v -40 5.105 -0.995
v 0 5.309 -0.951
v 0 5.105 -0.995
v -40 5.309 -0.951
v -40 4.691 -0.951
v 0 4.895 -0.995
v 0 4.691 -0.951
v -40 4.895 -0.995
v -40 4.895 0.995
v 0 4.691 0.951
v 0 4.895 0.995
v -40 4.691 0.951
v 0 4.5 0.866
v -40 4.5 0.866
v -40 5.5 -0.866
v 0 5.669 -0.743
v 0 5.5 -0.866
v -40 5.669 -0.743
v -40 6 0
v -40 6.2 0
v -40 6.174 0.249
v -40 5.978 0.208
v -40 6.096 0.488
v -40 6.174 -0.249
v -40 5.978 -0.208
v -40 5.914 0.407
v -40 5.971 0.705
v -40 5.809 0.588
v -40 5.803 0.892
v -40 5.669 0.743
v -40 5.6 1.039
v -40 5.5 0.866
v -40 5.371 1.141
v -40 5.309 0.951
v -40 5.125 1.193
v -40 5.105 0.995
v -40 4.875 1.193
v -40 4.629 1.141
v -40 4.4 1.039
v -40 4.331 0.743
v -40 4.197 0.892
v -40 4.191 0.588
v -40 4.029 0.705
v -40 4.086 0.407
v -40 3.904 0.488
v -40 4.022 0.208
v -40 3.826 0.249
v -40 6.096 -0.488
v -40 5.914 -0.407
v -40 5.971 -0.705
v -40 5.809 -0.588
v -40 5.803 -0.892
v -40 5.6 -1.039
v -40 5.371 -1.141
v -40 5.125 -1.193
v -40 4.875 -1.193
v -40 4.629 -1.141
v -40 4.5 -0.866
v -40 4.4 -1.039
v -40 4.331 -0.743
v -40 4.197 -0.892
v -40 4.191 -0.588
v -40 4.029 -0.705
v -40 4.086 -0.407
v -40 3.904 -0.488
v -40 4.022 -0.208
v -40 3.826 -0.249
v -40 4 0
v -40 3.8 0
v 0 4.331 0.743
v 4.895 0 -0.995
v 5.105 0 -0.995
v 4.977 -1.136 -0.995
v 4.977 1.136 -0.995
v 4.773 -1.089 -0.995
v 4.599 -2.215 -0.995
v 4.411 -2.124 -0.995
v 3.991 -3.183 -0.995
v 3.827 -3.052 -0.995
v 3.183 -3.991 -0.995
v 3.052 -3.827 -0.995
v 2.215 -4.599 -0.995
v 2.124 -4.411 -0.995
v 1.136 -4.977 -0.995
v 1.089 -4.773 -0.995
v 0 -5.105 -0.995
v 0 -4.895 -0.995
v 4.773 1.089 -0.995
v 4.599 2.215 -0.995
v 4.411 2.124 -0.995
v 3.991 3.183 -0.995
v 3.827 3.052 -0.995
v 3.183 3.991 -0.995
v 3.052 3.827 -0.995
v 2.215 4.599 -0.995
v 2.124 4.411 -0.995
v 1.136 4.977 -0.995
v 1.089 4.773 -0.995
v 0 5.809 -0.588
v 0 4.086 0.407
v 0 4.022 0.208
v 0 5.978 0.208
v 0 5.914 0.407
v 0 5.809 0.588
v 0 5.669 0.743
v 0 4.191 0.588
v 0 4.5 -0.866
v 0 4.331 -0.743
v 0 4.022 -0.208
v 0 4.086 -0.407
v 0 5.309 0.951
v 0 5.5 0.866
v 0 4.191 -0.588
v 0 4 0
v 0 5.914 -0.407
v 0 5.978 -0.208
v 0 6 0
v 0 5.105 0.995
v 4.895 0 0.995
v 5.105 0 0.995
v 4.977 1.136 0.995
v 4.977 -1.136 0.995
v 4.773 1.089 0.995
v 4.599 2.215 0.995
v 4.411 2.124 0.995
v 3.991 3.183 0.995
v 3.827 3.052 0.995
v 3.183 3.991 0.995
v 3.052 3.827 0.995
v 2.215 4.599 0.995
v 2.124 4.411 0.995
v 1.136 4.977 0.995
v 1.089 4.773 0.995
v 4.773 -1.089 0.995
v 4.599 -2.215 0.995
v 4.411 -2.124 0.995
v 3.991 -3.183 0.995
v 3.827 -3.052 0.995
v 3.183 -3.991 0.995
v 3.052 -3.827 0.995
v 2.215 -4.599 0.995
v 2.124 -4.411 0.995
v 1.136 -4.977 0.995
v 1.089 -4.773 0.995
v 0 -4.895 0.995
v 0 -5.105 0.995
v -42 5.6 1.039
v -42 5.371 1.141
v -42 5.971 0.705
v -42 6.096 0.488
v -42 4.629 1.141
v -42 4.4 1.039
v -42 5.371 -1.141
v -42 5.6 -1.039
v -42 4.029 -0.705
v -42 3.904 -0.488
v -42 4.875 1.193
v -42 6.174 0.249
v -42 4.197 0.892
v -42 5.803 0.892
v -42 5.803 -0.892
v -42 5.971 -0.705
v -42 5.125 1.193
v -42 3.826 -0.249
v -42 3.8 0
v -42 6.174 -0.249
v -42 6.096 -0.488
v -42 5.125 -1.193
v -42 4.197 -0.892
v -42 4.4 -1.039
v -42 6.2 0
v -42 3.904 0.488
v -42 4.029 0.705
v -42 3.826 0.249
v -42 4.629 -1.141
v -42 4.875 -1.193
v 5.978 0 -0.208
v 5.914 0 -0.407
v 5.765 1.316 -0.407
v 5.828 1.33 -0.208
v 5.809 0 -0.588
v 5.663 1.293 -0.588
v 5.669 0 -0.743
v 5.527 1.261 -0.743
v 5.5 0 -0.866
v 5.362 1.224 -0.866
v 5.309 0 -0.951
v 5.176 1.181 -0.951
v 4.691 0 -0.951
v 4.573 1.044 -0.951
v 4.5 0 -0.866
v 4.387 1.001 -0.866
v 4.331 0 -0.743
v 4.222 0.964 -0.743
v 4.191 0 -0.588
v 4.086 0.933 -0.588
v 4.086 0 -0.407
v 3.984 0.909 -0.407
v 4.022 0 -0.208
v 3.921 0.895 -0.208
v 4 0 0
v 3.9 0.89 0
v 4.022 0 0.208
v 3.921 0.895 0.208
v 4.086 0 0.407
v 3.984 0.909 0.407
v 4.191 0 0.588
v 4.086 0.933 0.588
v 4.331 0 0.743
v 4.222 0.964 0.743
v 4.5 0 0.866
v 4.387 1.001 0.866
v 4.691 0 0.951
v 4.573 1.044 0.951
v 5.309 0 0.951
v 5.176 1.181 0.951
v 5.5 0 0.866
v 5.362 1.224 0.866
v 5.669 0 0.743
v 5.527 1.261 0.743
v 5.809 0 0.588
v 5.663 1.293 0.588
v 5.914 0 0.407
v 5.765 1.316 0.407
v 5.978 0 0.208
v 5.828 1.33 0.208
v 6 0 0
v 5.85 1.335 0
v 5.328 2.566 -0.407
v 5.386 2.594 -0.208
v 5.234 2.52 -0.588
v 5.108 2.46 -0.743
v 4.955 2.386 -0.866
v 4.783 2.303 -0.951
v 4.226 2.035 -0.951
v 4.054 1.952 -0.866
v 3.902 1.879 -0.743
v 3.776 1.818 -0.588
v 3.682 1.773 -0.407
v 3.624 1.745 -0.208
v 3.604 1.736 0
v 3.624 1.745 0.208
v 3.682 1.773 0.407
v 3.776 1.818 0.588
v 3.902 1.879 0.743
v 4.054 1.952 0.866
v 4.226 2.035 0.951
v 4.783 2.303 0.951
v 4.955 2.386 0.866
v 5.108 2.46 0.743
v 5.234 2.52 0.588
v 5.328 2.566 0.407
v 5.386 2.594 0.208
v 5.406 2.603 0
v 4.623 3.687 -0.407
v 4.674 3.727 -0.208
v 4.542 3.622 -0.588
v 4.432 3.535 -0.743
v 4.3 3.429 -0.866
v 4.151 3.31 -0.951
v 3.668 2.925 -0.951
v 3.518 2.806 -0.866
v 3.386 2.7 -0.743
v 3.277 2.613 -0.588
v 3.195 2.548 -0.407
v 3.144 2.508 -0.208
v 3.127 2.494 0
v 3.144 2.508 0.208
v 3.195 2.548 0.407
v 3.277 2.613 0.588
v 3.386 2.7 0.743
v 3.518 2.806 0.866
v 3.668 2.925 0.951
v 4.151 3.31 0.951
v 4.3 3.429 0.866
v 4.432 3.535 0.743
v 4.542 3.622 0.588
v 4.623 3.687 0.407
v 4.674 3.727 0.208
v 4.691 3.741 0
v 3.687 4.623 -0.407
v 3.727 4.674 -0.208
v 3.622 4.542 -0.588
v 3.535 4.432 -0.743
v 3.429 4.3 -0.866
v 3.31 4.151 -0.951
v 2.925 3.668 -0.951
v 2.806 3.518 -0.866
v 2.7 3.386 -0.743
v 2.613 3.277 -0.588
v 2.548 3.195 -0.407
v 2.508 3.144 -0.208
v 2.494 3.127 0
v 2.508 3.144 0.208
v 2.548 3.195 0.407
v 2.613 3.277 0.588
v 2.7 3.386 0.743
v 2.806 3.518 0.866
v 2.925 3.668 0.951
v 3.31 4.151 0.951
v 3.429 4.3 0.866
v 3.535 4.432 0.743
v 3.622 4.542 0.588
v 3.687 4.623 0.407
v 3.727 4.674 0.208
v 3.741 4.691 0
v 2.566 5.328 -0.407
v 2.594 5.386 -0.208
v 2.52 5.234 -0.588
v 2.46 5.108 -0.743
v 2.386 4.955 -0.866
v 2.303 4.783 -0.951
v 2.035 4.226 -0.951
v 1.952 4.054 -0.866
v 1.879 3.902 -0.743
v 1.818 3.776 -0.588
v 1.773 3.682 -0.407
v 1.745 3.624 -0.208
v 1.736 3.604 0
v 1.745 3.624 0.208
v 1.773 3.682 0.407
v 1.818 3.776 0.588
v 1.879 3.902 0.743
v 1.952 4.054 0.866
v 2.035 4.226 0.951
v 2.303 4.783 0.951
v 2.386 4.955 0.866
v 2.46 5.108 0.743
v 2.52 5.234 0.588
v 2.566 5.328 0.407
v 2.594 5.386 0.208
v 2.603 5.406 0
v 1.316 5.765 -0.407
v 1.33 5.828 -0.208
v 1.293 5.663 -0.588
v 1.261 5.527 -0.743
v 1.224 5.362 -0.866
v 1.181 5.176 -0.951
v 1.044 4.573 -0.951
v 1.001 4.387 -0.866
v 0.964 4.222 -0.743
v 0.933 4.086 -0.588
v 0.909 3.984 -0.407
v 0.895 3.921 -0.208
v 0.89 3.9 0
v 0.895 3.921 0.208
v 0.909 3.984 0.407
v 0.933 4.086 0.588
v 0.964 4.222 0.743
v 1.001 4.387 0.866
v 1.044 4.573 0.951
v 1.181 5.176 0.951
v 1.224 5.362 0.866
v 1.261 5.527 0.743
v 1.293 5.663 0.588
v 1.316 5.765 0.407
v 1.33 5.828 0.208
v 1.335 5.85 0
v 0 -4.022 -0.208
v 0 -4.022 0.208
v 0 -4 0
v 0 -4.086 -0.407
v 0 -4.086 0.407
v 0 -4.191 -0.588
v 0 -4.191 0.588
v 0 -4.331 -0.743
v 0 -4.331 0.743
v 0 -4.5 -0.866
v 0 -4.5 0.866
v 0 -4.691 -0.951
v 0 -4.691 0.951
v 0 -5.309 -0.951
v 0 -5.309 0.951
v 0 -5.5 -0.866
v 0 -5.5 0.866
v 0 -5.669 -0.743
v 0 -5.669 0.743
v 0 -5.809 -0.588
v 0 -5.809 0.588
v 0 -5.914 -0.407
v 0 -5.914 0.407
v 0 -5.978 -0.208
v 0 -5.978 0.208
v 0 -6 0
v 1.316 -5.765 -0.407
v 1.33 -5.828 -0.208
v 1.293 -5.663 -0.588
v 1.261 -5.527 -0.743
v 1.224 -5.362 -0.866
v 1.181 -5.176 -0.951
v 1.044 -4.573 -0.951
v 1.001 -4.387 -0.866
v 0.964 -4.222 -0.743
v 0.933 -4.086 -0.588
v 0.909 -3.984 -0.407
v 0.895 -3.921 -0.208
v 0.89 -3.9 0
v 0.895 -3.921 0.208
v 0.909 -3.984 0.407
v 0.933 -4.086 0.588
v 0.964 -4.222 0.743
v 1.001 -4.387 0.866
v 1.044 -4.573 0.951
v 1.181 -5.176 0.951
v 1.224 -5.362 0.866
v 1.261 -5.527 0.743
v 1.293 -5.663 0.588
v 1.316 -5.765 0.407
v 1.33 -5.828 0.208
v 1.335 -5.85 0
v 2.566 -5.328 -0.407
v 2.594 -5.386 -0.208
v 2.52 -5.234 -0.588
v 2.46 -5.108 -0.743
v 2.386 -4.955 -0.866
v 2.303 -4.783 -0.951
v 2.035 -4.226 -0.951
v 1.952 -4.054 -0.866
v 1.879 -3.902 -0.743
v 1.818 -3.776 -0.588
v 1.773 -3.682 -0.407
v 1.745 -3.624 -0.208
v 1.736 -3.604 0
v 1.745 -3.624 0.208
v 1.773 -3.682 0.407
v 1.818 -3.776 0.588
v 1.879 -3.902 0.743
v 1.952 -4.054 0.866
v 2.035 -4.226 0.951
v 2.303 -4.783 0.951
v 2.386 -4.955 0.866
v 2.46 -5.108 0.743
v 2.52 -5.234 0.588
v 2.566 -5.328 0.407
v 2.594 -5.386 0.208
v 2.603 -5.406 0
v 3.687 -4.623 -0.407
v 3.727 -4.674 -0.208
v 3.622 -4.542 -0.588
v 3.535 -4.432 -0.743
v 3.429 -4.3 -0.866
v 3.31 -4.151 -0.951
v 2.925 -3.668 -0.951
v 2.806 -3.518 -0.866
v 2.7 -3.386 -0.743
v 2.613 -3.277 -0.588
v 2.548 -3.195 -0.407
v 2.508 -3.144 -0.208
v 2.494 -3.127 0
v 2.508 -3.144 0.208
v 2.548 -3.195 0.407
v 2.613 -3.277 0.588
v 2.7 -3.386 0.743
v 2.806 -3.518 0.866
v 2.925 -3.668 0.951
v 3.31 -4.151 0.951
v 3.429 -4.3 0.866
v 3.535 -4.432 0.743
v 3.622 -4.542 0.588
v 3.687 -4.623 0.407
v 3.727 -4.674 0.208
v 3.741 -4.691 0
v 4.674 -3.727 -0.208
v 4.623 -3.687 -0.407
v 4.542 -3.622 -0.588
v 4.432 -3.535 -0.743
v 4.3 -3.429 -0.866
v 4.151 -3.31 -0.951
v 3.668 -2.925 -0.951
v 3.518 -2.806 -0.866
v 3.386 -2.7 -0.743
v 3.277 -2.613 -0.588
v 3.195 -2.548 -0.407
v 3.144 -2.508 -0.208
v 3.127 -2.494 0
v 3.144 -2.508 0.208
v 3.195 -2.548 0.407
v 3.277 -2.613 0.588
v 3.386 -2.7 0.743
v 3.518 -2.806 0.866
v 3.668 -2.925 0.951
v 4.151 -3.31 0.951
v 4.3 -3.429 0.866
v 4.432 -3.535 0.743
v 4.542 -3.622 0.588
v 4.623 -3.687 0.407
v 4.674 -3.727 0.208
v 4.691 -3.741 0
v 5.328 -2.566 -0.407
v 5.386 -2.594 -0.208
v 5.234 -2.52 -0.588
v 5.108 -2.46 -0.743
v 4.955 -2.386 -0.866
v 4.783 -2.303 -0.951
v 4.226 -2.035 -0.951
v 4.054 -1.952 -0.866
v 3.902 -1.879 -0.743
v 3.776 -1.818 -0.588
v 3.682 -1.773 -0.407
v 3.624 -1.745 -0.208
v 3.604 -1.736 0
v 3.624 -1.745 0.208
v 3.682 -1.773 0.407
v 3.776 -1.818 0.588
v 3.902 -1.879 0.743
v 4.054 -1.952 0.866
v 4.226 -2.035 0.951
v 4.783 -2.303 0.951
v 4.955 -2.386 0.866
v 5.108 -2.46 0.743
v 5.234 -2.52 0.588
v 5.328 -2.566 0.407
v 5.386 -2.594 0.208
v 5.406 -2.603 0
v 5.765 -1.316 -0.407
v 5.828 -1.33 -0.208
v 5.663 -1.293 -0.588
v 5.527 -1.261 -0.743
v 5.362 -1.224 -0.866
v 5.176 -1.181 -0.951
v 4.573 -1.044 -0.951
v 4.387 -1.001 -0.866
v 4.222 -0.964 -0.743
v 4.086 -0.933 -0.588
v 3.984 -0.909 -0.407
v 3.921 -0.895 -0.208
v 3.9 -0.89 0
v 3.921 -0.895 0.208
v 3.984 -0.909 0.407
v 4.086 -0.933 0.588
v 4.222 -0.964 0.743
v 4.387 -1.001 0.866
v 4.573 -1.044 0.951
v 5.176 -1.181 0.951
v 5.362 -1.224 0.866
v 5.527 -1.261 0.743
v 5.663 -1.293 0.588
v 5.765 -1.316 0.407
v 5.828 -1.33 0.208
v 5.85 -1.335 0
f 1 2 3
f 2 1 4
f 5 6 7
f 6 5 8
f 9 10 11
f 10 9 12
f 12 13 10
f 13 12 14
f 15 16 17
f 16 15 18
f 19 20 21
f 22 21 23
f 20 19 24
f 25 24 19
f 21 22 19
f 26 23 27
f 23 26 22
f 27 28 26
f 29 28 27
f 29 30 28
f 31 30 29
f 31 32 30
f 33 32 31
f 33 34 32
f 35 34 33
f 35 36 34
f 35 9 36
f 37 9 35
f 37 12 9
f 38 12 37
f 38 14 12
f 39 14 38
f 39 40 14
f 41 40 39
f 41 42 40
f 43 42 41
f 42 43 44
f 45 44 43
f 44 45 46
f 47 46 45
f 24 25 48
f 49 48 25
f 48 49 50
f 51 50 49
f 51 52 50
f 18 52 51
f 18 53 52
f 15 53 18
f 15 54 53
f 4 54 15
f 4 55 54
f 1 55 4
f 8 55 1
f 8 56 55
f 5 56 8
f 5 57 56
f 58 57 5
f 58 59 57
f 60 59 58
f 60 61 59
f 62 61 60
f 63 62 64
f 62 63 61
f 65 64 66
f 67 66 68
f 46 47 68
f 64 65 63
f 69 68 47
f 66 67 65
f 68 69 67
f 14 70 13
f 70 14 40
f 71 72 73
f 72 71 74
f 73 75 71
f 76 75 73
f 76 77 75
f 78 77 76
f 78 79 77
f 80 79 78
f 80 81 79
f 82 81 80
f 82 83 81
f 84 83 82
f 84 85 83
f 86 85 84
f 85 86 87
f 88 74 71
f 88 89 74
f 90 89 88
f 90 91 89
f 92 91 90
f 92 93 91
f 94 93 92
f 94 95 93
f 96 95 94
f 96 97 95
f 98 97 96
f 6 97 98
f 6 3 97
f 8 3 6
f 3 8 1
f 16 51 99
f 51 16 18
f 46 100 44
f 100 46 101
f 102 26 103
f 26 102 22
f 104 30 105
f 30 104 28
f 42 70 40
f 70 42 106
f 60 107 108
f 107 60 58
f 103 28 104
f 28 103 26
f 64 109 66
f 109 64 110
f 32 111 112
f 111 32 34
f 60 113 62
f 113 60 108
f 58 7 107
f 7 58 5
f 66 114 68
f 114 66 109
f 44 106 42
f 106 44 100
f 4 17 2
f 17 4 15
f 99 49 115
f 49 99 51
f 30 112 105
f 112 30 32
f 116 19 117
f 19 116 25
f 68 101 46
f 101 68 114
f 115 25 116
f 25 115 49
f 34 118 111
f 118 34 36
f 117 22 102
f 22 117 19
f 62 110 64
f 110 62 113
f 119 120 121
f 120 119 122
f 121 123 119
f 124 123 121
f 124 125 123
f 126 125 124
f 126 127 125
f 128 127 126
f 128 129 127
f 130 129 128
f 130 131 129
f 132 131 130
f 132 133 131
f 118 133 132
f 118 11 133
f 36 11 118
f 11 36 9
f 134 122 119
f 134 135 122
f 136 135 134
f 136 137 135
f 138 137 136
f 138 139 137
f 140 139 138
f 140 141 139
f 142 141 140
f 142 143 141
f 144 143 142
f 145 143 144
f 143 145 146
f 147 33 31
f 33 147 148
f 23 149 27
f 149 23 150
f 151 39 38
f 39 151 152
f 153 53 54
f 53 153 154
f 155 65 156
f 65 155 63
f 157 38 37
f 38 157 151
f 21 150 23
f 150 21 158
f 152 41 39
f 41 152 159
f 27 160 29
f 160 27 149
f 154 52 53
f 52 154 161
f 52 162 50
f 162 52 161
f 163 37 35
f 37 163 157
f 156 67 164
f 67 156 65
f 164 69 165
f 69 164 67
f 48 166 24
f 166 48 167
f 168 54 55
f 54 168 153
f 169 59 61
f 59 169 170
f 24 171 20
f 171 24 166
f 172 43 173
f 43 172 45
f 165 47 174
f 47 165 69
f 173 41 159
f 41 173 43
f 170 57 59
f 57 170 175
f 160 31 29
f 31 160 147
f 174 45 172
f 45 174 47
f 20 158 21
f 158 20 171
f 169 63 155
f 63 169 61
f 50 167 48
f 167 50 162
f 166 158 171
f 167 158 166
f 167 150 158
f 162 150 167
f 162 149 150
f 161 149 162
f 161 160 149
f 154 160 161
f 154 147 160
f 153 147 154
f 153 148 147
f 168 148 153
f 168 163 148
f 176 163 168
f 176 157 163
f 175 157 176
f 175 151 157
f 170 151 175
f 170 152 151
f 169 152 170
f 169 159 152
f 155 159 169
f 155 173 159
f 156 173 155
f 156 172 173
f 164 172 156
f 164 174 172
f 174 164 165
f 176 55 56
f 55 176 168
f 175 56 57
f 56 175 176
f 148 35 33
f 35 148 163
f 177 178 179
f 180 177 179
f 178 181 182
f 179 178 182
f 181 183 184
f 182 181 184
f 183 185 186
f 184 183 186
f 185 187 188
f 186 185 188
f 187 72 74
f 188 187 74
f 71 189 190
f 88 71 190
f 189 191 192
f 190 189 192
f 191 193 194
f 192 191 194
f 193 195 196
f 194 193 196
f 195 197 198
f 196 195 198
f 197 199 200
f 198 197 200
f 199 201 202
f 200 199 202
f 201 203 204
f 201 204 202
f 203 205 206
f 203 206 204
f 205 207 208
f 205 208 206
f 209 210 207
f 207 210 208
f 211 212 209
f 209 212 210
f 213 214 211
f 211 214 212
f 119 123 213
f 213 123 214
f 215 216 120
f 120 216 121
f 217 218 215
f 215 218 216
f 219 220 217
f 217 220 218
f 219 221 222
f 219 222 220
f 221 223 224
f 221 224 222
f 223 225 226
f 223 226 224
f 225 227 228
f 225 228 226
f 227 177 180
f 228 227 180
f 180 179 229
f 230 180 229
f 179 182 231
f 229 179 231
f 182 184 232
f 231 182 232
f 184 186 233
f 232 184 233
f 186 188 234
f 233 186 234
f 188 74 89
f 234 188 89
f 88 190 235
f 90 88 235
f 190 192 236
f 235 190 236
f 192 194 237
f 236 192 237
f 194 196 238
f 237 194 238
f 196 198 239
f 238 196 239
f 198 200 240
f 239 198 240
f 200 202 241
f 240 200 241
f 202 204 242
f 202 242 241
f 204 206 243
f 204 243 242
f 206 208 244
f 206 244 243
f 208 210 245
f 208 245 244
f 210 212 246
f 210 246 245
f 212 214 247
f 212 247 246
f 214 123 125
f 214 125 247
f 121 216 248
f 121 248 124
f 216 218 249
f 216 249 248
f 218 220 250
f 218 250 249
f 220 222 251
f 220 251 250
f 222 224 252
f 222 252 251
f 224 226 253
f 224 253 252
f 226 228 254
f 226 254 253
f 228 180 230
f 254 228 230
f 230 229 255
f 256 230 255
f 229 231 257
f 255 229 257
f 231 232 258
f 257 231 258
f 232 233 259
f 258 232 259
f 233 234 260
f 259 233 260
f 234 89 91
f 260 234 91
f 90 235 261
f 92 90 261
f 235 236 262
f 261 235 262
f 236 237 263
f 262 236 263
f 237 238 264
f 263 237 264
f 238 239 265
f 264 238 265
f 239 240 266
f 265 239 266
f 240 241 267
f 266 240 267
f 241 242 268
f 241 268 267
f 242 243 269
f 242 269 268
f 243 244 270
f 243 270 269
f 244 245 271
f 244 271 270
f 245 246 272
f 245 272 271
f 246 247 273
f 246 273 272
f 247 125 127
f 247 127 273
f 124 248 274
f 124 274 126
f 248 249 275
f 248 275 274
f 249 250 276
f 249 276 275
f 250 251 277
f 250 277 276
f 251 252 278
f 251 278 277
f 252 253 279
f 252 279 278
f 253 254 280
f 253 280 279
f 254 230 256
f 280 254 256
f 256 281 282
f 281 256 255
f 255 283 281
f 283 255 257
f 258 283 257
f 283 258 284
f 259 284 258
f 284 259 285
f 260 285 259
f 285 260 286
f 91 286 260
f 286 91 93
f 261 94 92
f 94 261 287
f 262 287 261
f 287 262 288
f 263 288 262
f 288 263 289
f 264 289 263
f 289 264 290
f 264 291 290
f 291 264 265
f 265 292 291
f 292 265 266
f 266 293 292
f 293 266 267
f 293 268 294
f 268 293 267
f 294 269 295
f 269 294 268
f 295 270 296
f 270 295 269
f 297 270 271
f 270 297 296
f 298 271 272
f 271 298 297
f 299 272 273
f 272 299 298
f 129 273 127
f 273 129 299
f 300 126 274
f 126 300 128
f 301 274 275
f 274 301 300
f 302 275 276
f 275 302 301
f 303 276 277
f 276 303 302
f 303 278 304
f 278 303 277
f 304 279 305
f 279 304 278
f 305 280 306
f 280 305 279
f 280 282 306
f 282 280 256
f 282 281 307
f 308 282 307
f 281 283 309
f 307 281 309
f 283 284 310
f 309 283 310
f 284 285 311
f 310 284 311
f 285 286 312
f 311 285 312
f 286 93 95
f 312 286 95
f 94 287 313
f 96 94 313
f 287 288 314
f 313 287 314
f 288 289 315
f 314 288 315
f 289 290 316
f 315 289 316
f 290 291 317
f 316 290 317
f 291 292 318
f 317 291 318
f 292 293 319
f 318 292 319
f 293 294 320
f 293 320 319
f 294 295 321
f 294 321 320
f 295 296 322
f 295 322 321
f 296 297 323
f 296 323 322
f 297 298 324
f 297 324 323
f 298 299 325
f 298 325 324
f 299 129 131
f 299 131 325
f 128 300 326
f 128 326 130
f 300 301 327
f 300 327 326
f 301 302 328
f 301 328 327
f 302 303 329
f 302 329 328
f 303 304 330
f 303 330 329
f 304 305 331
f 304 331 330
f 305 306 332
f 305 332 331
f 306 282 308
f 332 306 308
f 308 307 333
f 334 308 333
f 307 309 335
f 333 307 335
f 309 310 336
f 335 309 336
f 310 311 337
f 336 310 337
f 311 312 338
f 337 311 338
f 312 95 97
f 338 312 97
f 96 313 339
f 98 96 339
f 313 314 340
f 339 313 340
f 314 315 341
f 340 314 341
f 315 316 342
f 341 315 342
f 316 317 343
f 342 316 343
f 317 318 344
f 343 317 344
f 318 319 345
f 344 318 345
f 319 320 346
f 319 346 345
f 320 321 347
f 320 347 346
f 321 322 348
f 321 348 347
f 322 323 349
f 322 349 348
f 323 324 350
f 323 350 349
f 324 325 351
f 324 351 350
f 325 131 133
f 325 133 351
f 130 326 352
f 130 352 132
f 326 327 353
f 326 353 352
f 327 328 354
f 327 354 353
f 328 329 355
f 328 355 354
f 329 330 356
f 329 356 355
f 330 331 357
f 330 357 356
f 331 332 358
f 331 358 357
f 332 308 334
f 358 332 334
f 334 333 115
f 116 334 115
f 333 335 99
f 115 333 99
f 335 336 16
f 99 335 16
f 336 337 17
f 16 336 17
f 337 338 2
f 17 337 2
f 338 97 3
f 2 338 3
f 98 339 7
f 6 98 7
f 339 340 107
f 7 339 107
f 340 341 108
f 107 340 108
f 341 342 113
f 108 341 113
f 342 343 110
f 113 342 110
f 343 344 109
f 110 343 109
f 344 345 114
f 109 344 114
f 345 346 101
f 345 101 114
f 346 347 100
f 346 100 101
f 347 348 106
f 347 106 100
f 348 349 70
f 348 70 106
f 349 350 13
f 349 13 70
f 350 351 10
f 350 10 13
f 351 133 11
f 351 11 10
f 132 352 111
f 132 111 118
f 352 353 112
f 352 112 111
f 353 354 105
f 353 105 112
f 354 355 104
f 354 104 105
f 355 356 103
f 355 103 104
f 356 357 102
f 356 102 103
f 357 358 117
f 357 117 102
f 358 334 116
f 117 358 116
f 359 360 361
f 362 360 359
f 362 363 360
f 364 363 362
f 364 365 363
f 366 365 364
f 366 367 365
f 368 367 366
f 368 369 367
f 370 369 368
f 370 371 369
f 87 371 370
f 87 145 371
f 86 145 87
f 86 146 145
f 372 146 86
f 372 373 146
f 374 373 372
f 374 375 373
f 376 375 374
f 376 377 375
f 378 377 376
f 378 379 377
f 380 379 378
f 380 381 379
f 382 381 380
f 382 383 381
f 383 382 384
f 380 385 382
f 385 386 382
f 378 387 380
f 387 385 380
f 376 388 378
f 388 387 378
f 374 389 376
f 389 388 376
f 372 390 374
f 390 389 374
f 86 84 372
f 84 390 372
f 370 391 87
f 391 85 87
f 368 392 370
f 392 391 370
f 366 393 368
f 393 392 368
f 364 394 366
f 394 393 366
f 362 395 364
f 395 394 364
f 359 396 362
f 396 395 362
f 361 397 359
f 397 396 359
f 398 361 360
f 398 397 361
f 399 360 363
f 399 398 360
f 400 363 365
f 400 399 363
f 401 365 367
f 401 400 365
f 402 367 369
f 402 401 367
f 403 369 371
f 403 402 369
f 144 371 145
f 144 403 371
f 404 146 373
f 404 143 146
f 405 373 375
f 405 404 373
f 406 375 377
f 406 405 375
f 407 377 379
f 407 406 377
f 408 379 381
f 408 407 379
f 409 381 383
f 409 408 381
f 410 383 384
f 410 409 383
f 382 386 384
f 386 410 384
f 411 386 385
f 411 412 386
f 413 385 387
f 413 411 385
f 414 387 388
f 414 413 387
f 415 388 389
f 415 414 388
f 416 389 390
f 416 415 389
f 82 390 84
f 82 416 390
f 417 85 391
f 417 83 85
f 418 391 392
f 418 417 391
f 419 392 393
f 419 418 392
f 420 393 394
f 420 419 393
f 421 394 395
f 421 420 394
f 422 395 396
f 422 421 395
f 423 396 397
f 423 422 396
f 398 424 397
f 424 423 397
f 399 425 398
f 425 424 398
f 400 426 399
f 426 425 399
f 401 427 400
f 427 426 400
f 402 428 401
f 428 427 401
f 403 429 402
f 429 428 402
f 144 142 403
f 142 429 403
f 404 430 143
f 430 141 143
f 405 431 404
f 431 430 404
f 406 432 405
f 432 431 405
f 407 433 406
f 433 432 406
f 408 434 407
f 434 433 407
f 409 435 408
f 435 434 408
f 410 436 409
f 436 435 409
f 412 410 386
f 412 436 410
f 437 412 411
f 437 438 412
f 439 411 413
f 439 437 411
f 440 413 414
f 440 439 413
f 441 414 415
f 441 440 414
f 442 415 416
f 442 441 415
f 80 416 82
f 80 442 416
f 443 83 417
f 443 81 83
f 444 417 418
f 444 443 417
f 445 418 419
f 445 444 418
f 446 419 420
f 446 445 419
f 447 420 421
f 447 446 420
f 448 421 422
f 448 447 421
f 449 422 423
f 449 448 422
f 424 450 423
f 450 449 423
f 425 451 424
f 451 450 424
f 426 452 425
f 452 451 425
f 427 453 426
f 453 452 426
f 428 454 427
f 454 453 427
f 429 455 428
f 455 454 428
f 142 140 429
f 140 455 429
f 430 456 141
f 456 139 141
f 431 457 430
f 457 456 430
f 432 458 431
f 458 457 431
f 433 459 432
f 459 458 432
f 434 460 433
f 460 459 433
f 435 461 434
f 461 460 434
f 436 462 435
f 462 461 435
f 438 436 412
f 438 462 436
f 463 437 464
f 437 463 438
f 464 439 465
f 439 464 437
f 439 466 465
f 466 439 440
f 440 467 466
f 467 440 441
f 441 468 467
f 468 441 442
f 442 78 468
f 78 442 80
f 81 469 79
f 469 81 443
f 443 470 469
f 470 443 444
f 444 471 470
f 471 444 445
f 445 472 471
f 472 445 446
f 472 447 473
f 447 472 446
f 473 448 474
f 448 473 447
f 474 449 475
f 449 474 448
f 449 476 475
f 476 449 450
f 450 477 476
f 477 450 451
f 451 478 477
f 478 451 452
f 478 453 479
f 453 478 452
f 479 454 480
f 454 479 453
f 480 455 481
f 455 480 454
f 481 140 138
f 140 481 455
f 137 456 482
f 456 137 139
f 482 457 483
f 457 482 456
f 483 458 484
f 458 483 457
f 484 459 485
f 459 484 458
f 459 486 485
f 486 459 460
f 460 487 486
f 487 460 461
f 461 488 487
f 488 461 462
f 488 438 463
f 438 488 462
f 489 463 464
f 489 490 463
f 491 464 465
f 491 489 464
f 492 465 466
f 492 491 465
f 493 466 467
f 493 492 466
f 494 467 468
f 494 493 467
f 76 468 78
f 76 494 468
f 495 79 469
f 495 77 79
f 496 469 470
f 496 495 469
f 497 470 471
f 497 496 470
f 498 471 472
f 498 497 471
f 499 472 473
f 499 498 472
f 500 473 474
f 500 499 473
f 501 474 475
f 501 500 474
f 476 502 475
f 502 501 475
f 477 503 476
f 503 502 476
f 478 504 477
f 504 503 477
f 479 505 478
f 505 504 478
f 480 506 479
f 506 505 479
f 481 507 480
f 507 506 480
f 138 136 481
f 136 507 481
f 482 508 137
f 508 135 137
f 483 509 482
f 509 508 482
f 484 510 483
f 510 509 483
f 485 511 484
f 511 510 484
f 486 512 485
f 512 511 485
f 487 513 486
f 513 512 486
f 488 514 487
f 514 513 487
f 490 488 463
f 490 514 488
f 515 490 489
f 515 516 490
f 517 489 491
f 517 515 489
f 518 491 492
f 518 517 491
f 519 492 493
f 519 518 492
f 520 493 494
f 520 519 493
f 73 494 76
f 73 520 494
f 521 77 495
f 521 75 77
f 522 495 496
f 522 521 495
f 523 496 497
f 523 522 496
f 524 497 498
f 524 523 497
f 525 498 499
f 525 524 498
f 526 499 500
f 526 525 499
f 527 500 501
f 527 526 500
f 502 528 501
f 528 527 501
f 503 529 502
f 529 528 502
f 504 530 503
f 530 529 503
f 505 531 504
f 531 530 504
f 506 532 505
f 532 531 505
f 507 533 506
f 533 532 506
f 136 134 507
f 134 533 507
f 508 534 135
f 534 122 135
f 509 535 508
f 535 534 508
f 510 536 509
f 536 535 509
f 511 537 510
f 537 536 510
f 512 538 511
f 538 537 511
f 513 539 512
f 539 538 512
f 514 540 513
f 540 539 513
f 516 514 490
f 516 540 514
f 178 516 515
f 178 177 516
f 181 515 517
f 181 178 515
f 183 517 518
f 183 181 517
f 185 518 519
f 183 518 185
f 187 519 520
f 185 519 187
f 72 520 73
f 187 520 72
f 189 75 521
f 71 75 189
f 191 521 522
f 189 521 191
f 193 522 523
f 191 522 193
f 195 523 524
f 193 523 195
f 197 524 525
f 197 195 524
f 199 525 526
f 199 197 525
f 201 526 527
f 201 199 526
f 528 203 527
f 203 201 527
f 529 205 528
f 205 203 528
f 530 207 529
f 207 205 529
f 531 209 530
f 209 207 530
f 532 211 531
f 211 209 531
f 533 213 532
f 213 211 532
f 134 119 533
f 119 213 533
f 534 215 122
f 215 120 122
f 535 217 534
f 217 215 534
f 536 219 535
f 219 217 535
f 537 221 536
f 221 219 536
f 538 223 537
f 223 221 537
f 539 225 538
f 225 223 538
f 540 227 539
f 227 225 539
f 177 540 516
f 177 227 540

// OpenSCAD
module Walking_Stick(){

    module shaft(){ 
        color("#56483c"){
            translate([0,5,0])
            rotate([30,0,0])
            rotate([0,-90,0])
            linear_extrude(height = 40, $fn = 30) 
            circle(r = 1);
        }
                  
        color("#2a393e"){  
            translate([-40,5,0]){
            color("#a8b0b2")
            rotate([30,0,0])
            rotate([0,-90,0])
            
            linear_extrude(height = 2, $fn = 30) 
            circle(r = 1.2);
            } 
        }
      
    }
     
    shaft();
          
    color("#56483c"){
        rotate_extrude(angle = 90, $fn = 30)
        translate([5,0,0])
        circle(r = 1); 
    }
           
    color("#56483c"){
        rotate([0,0,-90])
        rotate_extrude(angle = 90, $fn = 30)
        translate([5,0,0])
        circle(r = 1);
    }
  
}

Walking_Stick();


// Written by Nicolì Angelo (Gengio) 2024: 
// MIT License

//Permission is hereby granted, free of charge, to any person obtaining a copy of this software and associated documentation files (the "Software"), to deal in the Software without restriction, including without limitation the rights to use, copy, modify, merge, publish, distribute, sublicense, and/or sell copies of the Software, and to permit persons to whom the Software is furnished to do so, subject to the following conditions:

//The above copyright notice and this permission notice shall be included in all copies or substantial portions of the Software.

//THE SOFTWARE IS PROVIDED "AS IS", WITHOUT WARRANTY OF ANY KIND, EXPRESS OR IMPLIED, INCLUDING BUT NOT LIMITED TO THE WARRANTIES OF MERCHANTABILITY, FITNESS FOR A PARTICULAR PURPOSE AND NONINFRINGEMENT. IN NO EVENT SHALL THE AUTHORS OR COPYRIGHT HOLDERS BE LIABLE FOR ANY CLAIM, DAMAGES OR OTHER LIABILITY, WHETHER IN AN ACTION OF CONTRACT, TORT OR OTHERWISE, ARISING FROM, OUT OF OR IN CONNECTION WITH THE SOFTWARE OR THE USE OR OTHER DEALINGS IN THE SOFTWARE.
